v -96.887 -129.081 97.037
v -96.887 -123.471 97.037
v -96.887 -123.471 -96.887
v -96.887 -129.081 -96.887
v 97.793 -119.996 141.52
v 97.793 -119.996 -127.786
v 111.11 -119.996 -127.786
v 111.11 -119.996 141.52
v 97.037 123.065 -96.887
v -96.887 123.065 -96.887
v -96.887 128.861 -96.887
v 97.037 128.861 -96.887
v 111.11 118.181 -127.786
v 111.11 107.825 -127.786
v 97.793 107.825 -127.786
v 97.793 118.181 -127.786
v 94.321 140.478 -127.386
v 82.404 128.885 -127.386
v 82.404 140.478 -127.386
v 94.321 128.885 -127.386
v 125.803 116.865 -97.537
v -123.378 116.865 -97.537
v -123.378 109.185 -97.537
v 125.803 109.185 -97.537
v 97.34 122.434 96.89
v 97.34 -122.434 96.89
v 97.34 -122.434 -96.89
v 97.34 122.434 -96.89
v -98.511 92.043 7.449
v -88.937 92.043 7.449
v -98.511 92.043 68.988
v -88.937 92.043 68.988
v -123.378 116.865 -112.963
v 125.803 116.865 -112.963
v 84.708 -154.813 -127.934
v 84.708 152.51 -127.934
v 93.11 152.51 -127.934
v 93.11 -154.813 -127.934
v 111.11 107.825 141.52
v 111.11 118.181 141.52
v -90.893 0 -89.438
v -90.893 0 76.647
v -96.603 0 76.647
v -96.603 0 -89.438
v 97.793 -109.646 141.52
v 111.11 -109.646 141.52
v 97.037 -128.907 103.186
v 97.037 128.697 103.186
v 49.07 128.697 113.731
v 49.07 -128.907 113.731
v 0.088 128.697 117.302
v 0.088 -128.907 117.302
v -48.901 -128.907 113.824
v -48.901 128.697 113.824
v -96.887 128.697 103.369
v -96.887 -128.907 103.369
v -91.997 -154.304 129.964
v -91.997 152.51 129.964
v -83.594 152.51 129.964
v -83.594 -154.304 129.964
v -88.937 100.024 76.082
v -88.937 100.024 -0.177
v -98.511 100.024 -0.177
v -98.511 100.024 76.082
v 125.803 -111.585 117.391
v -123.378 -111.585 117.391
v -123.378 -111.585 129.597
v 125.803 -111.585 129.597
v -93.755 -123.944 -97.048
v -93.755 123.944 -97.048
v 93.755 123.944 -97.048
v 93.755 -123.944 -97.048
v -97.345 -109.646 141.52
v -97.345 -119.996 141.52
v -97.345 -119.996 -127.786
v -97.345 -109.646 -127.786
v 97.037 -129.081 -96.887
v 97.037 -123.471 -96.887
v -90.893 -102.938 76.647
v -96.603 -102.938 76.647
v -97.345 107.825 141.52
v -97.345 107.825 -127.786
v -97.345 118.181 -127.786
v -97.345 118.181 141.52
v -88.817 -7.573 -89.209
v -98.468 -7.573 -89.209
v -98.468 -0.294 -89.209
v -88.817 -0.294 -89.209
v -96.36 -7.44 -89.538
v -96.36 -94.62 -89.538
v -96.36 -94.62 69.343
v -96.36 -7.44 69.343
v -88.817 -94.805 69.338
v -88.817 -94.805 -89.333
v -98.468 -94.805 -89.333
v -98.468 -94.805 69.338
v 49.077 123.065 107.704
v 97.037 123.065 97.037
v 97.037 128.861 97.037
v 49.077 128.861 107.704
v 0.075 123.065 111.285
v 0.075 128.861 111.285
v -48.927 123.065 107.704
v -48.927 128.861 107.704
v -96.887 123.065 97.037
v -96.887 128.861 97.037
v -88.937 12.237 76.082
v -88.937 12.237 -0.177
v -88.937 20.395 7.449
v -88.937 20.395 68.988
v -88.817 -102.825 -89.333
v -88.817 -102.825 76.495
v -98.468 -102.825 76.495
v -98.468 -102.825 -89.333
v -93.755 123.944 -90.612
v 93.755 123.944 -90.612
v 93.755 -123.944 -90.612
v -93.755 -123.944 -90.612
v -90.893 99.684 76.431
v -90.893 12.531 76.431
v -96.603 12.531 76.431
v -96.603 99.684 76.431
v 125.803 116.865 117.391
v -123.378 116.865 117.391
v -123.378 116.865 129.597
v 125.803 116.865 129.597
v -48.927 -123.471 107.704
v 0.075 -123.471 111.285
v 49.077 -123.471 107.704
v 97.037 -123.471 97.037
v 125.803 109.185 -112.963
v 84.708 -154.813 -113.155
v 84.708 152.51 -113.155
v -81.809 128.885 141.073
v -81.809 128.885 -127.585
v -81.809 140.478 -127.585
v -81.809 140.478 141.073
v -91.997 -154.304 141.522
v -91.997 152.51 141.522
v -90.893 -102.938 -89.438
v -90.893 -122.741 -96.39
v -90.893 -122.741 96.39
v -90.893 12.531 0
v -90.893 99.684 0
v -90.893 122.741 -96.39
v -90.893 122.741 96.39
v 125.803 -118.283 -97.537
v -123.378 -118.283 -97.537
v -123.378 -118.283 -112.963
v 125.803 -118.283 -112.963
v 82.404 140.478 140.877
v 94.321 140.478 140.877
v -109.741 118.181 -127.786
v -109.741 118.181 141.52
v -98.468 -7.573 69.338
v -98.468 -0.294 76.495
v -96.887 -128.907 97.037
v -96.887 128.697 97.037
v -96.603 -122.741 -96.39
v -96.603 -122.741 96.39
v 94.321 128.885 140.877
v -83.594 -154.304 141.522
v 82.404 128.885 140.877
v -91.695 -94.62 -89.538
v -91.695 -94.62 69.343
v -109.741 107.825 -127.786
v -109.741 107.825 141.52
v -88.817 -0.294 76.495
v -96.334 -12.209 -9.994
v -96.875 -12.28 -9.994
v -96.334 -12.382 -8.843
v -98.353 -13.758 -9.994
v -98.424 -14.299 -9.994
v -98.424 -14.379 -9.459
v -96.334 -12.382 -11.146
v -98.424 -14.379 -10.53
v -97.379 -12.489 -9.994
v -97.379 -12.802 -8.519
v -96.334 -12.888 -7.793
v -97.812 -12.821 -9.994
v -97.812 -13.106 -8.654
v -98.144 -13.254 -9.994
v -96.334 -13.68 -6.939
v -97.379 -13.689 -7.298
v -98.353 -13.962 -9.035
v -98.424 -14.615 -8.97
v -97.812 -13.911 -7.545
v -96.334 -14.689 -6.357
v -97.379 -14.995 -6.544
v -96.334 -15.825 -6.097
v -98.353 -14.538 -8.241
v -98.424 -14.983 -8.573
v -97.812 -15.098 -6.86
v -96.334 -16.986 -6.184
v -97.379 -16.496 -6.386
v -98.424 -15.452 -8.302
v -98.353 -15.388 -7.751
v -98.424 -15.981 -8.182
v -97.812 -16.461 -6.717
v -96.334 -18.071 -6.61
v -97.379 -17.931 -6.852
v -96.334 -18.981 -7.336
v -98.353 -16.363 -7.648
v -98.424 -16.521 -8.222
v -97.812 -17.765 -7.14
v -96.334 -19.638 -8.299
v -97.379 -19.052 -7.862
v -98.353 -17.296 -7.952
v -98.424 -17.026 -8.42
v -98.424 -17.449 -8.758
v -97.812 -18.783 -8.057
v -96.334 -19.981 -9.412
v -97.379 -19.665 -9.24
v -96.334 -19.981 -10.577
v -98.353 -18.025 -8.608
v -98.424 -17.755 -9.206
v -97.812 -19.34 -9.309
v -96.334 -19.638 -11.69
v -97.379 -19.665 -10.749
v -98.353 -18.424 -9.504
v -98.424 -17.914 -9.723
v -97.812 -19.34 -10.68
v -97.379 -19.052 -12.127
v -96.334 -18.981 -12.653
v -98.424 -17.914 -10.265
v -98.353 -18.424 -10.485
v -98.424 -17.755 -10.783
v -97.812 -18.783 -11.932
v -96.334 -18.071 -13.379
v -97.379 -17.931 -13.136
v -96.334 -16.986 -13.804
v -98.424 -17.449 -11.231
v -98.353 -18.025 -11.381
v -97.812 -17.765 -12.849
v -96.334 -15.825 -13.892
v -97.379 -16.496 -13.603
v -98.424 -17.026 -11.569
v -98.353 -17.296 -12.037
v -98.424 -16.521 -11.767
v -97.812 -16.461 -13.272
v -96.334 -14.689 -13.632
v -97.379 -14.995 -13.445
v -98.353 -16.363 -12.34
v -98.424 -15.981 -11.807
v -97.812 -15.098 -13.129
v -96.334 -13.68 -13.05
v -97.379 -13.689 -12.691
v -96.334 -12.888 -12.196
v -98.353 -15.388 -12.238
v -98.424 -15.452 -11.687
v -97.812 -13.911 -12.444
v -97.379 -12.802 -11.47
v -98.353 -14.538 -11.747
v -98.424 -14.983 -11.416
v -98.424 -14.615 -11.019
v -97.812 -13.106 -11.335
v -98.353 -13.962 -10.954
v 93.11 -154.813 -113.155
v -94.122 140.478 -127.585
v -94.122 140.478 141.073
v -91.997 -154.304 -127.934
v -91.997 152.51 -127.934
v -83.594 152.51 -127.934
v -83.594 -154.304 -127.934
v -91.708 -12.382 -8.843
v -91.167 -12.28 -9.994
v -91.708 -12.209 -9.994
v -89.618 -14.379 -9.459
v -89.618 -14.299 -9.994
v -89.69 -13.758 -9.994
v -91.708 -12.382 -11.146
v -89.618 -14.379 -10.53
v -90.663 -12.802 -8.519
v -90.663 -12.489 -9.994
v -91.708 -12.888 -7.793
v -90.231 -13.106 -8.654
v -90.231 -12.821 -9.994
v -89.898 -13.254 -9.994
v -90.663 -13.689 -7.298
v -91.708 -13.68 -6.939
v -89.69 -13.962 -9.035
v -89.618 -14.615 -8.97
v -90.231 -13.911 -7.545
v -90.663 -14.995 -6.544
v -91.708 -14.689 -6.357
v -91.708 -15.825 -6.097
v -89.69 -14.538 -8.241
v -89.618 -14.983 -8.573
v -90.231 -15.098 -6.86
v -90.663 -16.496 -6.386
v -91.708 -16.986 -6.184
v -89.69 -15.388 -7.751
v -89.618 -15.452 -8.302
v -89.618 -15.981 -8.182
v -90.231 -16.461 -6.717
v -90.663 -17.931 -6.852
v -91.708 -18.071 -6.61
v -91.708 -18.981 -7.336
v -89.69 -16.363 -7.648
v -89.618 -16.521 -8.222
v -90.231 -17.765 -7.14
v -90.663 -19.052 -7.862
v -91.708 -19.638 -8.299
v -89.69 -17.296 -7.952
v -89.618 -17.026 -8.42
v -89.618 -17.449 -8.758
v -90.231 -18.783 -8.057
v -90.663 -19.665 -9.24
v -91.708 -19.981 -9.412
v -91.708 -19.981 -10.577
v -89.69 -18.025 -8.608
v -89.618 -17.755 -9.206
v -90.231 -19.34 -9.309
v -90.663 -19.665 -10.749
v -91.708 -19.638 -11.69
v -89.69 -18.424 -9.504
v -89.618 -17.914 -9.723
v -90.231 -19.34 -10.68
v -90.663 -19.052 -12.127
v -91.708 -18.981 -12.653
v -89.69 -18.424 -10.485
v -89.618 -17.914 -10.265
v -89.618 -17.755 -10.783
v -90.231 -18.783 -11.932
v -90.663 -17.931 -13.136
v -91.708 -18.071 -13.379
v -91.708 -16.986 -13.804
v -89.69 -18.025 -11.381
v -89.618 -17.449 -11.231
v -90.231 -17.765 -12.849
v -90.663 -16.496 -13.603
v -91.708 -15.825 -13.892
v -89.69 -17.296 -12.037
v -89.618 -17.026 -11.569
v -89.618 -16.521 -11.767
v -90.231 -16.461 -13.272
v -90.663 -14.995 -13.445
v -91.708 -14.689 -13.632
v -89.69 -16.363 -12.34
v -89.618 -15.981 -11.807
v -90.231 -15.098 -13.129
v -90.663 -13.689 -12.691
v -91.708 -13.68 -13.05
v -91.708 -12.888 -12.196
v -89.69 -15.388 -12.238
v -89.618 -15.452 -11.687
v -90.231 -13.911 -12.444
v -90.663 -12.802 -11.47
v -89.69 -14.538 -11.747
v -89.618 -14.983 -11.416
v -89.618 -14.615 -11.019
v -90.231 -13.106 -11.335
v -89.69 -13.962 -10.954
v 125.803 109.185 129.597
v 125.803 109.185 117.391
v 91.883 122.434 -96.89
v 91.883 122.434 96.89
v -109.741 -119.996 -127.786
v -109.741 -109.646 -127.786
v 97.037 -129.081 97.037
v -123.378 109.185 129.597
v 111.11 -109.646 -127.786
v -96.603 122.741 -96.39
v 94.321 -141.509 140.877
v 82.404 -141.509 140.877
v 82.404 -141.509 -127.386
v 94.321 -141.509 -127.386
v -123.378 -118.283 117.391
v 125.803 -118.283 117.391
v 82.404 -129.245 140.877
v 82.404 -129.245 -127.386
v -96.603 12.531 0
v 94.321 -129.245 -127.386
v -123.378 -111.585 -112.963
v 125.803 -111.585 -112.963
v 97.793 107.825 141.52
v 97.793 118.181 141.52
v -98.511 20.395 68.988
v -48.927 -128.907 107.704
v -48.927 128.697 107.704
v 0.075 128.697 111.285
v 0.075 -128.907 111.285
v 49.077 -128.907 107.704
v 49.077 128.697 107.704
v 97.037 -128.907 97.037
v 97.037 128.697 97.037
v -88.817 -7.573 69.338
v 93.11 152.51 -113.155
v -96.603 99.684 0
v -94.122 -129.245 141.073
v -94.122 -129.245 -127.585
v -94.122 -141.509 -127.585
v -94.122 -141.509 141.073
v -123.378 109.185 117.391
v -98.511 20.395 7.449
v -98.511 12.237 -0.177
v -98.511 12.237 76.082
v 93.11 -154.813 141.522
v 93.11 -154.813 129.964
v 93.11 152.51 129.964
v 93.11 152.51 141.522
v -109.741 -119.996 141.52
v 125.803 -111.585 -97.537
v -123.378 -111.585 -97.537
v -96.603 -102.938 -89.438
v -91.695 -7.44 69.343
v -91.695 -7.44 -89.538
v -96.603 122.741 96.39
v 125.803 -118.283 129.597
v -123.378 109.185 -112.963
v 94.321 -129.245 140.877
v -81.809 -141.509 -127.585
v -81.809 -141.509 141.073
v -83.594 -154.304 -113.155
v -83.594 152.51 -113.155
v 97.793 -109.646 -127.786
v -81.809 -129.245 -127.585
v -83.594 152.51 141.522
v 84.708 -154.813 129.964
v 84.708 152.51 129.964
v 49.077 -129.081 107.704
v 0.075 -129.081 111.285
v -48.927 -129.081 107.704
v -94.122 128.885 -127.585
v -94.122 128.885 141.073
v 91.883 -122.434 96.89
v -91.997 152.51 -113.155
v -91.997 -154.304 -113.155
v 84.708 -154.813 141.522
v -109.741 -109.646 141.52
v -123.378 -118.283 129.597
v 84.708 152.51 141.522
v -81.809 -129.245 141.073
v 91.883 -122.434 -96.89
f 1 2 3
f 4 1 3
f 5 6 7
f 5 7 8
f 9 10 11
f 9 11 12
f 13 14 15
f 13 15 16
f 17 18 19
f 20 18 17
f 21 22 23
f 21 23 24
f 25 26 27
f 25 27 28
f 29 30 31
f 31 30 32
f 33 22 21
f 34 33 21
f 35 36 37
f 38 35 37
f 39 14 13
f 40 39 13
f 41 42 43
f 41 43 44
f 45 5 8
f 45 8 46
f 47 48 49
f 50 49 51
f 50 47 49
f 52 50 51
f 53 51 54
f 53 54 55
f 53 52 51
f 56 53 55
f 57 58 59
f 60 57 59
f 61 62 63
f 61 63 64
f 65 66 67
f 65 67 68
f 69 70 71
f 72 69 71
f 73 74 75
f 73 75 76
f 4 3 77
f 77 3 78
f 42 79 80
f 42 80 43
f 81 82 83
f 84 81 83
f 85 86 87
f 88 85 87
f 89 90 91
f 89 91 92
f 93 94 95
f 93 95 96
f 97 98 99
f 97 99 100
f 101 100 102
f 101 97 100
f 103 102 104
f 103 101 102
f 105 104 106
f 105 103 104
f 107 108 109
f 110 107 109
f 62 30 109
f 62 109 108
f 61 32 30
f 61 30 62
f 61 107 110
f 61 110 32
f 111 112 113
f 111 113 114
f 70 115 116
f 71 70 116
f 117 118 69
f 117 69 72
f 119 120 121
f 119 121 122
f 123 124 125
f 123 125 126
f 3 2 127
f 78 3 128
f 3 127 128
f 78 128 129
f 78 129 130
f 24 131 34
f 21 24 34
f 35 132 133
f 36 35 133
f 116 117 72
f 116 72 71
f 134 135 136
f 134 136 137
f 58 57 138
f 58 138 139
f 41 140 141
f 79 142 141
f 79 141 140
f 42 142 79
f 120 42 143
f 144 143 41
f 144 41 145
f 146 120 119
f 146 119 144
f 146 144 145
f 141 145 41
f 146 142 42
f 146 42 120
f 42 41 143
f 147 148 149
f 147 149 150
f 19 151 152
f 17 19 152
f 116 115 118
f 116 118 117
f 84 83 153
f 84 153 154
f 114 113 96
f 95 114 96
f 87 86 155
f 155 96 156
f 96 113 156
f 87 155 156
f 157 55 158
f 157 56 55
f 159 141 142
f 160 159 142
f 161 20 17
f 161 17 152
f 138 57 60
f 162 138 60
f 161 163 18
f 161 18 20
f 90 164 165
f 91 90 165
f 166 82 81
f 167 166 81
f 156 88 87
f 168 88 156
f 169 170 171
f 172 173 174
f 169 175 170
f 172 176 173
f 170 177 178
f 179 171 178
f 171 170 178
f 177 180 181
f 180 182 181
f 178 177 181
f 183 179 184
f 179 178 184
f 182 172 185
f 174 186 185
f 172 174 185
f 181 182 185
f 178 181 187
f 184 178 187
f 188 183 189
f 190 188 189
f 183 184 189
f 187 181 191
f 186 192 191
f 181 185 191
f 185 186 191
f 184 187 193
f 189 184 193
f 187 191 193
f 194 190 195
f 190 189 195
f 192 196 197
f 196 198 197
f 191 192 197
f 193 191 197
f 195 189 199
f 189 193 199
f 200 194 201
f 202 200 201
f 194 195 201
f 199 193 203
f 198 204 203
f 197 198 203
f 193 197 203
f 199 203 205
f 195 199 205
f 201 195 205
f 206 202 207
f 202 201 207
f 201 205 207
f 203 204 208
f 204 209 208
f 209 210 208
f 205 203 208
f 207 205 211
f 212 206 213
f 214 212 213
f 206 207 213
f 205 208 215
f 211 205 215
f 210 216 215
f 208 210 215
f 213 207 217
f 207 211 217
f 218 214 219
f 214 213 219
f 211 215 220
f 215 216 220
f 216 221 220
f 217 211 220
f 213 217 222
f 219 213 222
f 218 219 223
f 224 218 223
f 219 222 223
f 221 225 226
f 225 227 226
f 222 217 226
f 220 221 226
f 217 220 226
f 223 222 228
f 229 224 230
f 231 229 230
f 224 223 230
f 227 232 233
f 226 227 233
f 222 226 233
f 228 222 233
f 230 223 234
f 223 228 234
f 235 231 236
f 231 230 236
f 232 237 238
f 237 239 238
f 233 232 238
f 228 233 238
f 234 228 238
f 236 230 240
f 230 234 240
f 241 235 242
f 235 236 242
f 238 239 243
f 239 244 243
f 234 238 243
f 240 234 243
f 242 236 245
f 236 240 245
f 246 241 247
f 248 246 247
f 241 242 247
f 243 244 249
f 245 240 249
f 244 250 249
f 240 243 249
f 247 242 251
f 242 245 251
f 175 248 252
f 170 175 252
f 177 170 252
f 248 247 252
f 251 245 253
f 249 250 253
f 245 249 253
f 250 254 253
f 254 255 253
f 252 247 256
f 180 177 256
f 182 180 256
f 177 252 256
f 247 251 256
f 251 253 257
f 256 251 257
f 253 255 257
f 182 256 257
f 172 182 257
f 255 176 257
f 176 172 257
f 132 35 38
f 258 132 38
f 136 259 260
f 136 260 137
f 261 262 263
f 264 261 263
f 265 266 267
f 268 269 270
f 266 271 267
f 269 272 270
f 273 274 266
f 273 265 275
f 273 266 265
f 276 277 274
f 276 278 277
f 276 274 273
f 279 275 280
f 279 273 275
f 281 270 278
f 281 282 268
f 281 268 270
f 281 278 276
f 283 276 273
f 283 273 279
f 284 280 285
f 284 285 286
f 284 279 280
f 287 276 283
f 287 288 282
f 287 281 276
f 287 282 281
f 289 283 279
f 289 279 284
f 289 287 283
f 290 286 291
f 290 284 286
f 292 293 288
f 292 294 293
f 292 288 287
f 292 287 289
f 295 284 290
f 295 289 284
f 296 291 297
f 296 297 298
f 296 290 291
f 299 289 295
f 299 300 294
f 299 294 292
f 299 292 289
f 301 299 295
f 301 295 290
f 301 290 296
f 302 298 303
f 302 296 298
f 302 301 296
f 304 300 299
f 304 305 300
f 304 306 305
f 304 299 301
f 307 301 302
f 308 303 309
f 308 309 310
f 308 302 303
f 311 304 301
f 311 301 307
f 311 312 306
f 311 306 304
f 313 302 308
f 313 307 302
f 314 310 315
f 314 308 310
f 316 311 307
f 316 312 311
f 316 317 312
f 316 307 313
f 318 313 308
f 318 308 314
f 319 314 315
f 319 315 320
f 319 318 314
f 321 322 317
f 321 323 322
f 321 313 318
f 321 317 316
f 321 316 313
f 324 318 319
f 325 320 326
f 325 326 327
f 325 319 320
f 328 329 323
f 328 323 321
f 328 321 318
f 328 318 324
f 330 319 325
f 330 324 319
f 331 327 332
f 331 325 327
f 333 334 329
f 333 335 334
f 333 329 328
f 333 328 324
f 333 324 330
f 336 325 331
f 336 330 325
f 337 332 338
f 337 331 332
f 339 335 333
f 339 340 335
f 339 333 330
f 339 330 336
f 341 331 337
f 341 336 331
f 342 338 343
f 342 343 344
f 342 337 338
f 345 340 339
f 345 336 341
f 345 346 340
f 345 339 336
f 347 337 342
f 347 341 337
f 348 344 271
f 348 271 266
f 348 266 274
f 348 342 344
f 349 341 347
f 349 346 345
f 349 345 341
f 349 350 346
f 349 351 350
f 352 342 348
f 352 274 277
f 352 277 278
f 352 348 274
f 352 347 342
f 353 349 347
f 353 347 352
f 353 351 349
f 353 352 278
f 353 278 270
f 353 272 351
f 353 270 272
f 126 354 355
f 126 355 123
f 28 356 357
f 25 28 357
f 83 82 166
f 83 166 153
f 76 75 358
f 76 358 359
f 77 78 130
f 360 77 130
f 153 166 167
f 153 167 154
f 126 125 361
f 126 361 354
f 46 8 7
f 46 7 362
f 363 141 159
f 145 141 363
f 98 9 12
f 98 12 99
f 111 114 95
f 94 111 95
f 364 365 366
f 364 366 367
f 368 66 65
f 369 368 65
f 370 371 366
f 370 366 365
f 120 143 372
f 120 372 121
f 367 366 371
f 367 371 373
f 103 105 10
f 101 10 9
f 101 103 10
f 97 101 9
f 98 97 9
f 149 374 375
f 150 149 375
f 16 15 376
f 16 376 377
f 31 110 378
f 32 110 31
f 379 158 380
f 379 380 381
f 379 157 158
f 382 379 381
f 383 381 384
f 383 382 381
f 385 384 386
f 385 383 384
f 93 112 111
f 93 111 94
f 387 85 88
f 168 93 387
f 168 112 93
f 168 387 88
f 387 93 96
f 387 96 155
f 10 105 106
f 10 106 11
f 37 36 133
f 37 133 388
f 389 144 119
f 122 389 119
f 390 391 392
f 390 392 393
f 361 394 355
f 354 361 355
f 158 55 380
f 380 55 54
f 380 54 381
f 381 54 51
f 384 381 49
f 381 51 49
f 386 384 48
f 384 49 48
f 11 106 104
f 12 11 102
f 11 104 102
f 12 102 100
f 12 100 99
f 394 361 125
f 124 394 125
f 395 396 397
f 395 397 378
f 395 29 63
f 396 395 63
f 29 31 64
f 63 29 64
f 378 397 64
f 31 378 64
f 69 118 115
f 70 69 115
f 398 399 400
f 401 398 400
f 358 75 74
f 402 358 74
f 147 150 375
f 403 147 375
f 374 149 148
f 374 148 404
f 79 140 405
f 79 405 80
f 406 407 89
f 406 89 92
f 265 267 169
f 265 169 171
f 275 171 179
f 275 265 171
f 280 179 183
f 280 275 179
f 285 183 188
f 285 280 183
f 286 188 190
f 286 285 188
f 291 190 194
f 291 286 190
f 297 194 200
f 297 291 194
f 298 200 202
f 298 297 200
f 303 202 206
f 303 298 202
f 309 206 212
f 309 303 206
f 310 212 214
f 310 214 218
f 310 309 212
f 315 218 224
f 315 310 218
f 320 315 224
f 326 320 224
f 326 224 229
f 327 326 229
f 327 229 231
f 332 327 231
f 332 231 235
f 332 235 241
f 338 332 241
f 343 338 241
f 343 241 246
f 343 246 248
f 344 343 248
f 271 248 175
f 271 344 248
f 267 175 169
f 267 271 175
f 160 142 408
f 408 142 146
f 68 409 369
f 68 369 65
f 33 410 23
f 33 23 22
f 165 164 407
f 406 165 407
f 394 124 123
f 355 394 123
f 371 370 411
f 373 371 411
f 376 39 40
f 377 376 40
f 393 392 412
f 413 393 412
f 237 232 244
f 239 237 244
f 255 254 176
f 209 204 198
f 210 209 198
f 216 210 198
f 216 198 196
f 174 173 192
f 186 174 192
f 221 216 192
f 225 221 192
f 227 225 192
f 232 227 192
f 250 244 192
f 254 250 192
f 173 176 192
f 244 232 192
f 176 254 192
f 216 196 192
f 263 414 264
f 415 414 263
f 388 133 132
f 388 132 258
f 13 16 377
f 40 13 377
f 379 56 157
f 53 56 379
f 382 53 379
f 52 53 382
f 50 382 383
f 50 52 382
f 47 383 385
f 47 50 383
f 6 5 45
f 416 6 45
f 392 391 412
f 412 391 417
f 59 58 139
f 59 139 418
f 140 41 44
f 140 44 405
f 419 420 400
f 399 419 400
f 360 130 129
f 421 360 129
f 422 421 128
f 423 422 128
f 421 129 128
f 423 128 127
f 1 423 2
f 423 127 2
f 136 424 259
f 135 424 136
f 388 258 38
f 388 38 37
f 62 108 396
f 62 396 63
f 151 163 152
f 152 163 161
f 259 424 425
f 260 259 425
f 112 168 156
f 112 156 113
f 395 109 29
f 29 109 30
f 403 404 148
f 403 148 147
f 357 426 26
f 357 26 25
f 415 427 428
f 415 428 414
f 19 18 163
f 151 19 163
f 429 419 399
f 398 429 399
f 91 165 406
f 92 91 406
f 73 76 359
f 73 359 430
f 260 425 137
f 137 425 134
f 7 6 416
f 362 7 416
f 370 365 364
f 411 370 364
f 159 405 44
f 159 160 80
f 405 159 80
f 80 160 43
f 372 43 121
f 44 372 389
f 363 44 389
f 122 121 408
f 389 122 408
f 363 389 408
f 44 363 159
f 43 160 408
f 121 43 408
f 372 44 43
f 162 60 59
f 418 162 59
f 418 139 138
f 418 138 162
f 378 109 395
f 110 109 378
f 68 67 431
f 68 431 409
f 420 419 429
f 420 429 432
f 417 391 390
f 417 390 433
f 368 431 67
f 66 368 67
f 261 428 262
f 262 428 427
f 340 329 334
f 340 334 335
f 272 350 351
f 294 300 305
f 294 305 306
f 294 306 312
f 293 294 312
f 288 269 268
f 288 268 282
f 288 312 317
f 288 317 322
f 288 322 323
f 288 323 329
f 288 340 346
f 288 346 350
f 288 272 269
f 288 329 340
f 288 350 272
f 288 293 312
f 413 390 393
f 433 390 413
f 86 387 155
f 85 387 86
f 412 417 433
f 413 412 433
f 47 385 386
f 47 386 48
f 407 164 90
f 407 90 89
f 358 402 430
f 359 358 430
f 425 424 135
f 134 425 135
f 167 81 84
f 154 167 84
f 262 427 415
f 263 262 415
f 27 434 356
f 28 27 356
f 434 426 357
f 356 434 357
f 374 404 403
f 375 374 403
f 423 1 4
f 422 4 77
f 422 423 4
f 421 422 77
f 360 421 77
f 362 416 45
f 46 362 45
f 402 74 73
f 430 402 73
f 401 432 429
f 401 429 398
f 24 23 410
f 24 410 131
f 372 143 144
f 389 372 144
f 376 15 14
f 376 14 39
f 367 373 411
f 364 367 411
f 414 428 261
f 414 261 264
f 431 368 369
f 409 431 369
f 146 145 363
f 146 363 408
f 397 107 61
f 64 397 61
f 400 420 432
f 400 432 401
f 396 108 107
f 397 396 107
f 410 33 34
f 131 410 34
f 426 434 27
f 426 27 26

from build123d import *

# Parameters (mm, degrees)
F3_START      = -123.0650097132
F3_DEPTH      = 5.7963579893
F5_START      = -90.6123444438
F4_W          = 187.5103265047
F4_H          = 247.888892889
F5_DEPTH      = 6.435342133
F6_DEPTH      = 128.9073675871
F6_DEPTH_BACK = 128.6972612143
F7_START      = 123.4710663557
F7_DEPTH      = 5.6094527245
F9_START      = 91.8827354908
F8_W          = 244.867682457
F8_H          = 193.7794089317
F9_DEPTH      = 5.4575353861
F11_START     = -90.8925160766
F10_W         = 245.4828619957
F10_H         = 192.7795410156
F10_W_2       = 87.1525136754
F10_H_2       = 76.4309763908
F11_DEPTH     = 5.7103261352
F10_W_3       = 72.0724808052
F10_H_3       = 61.7944300175
F12_DEPTH     = 25.4
F15_START     = -88.9365822077
F14_W         = 87.7868533134
F14_H         = 76.2592852116
F14_W_2       = 71.6482400894
F14_H_2       = 61.5394636989
F15_DEPTH     = 9.5741301775
F17_START     = -91.6945785284
F16_W         = 87.1799633379
F16_H         = 158.8803604245
F17_DEPTH     = 4.6653226018
F19_START     = -88.8174176216
F19_DEPTH     = 9.6507817507
F21_START     = -89.6183401346
F20_R         = 3.9080389163
F21_DEPTH     = 8.8060647249
F22_R         = 2.0900958716
F24_START     = 97.7928191423
F23_W         = 10.3558301926
F23_H         = 269.3057358265
F24_DEPTH     = 13.3169591427
F23_W_2       = 10.3495940566
F25_START     = -97.3452329636
F25_DEPTH     = 12.3960673809
F27_START     = -128.8853734732
F26_W         = 11.9174420834
F26_H         = 268.2635486126
F27_DEPTH     = 11.5931034088
F26_W_2       = 12.3124718666
F26_H_2       = 268.6581909657
F28_START     = 129.2447000742
F28_DEPTH     = 12.2640728951
F30_START     = 129.9640238285
F29_W         = 8.402377367
F29_H         = 306.8140745163
F30_DEPTH     = 11.5577429533
F29_H_2       = 307.3233067989
F31_START     = -113.1547391415
F31_DEPTH     = 14.7791802883
F33_START     = -97.5365191698
F32_W         = 249.1806745529
F32_H         = 7.6806098223
F33_DEPTH     = 15.4261887074
F32_H_2       = 6.6973119974
F34_START     = 117.3913180828
F34_DEPTH     = 12.2061520815


with BuildPart() as f3:
    # F0 (on Front) → F3 (new body)
    with BuildSketch(Plane.XZ.offset(F3_START)):
        with BuildLine():
            Line((97.0369726419, -96.8869626522), (97.0369726419, 97.0369651914))
            ThreePointArc((97.0369726419, 97.0369651914), (0.0750124454, 111.2850093867), (-96.886947751, 97.0369651914))
            Line((-96.886947751, 97.0369651914), (-96.886947751, -96.8869626522))
            Line((-96.886947751, -96.8869626522), (97.0369726419, -96.8869626522))
        make_face()
    extrude(amount=-F3_DEPTH)


with BuildPart() as f5:
    # F4 (on Top) → F5 (new body)
    with BuildSketch(Plane.XY.offset(F5_START)):
        Rectangle(F4_W, F4_H)
    extrude(amount=-F5_DEPTH)


with BuildPart() as f6:
    # F0 (on Front) → F6 (new body, two sides)
    with BuildSketch(Plane.XZ) as f6_sk:
        with BuildLine():
            ThreePointArc((-96.886947751, 97.0369651914), (0.0750124454, 111.2850093867), (97.0369726419, 97.0369651914))
            Line((97.0369726419, 97.0369651914), (97.0369726419, 103.1856536865))
            ThreePointArc((97.0369726419, 103.1856536865), (0.0882706031, 117.3016902224), (-96.886947751, 103.3689826727))
            Line((-96.886947751, 103.3689826727), (-96.886947751, 97.0369651914))
        make_face()
    extrude(amount=F6_DEPTH)
    extrude(f6_sk.sketch, amount=-F6_DEPTH_BACK)


with BuildPart() as f7:
    # F2 (on face) → F7 (new body)
    with BuildSketch(Plane.XZ.offset(F7_START)):
        with BuildLine():
            Line((-96.886947751, -96.8869626522), (97.0369726419, -96.8869626522))
            Line((97.0369726419, -96.8869626522), (97.0369726419, 97.0369651914))
            ThreePointArc((97.0369726419, 97.0369651914), (0.0750124454, 111.2850093867), (-96.886947751, 97.0369651914))
            Line((-96.886947751, 97.0369651914), (-96.886947751, -96.8869626522))
        make_face()
    extrude(amount=F7_DEPTH)


with BuildPart() as f9:
    # F8 (on Right) → F9 (new body)
    with BuildSketch(Plane.YZ.offset(F9_START)):
        Rectangle(F8_W, F8_H)
    extrude(amount=F9_DEPTH)


with BuildPart() as f11:
    # F10 (on Right) → F11 (new body)
    with BuildSketch(Plane.YZ.offset(F11_START)):
        Rectangle(F10_W, F10_H)
        Polygon((0, 76.6467601061), (0, 0), (0, -89.4377827644), (-102.9384583235, -89.4377827644), (-102.9384583235, 76.6467601061), align=None, mode=Mode.SUBTRACT)
        with Locations((56.1074004509, 38.2154881954)):
            Rectangle(F10_W_2, F10_H_2, mode=Mode.SUBTRACT)
    extrude(amount=-F11_DEPTH)


with BuildPart() as f12:
    # F10 (on Right) → F12 (new body)
    with BuildSketch(Plane.YZ):
        Rectangle(F10_W, F10_H)
        Polygon((0, 76.6467601061), (0, 0), (0, -89.4377827644), (-102.9384583235, -89.4377827644), (-102.9384583235, 76.6467601061), align=None, mode=Mode.SUBTRACT)
        with Locations((56.1074004509, 38.2154881954)):
            Rectangle(F10_W_2, F10_H_2, mode=Mode.SUBTRACT)
        with Locations((56.1074004509, 38.2154881954)):
            Rectangle(F10_W_2, F10_H_2)
        with Locations((56.1074004509, 38.2154881954)):
            Rectangle(F10_W_3, F10_H_3, mode=Mode.SUBTRACT)
    extrude(amount=F12_DEPTH)


with BuildPart() as f15:
    # F14 (on Right) → F15 (new body)
    with BuildSketch(Plane.YZ.offset(F15_START)):
        with Locations((56.1304092407, 37.9523038864)):
            Rectangle(F14_W, F14_H)
        with Locations((56.2190711498, 38.2183305919)):
            Rectangle(F14_W_2, F14_H_2, mode=Mode.SUBTRACT)
    extrude(amount=-F15_DEPTH)


with BuildPart() as f17:
    # F16 (on Right) → F17 (new body)
    with BuildSketch(Plane.YZ.offset(F17_START)):
        with Locations((-51.0302581129, -10.097425431)):
            Rectangle(F16_W, F16_H)
    extrude(amount=-F17_DEPTH)


with BuildPart() as f19:
    # F18 (on Right) → F19 (new body)
    with BuildSketch(Plane.YZ.offset(F19_START)):
        Polygon((-7.5731552206, -89.2094299197), (-0.29357741, -89.2094299197), (-0.29357741, 76.494500041), (-102.8251573443, 76.494500041), (-102.8251573443, -89.3327966332), (-94.805277884, -89.3327966332), (-94.805277884, 69.3382769823), (-7.5731552206, 69.3382769823), align=None)
    extrude(amount=-F19_DEPTH)


with BuildPart() as f21:
    # F20 (on Right) → F21 (new body)
    with BuildSketch(Plane.YZ.offset(F21_START)):
        with Locations((-16.1166191101, -9.9944323301)):
            Circle(F20_R)
    extrude(amount=-F21_DEPTH)

    # F22
    f22_edges = [f21.edges().sort_by_distance(p)[0] for p in [
        (-94.021372, -12.20858, -9.994432),
        (-89.61834, -20.024658, -9.994432),
        (-98.424405, -20.024658, -9.994432),
    ]]
    fillet(f22_edges, radius=F22_R)


with BuildPart() as f24:
    # F23 (on Right) → F24 (new body)
    with BuildSketch(Plane.YZ.offset(F24_START)):
        with Locations((113.0030080676, 6.8670511246)):
            Rectangle(F23_W, F23_H)
    extrude(amount=F24_DEPTH)


with BuildPart() as f24b:
    # F23 (on Right) → F24, piece 2 (new body)
    with BuildSketch(Plane.YZ.offset(F24_START)):
        with Locations((-114.8207075894, 6.8670511246)):
            Rectangle(F23_W_2, F23_H)
    extrude(amount=F24_DEPTH)


with BuildPart() as f25:
    # F23 (on Right) → F25 (new body)
    with BuildSketch(Plane.YZ.offset(F25_START)):
        with Locations((-114.8207075894, 6.8670511246)):
            Rectangle(F23_W_2, F23_H)
    extrude(amount=-F25_DEPTH)


with BuildPart() as f25b:
    # F23 (on Right) → F25, piece 2 (new body)
    with BuildSketch(Plane.YZ.offset(F25_START)):
        with Locations((113.0030080676, 6.8670511246)):
            Rectangle(F23_W, F23_H)
    extrude(amount=-F25_DEPTH)


with BuildPart() as f27:
    # F26 (on Front) → F27 (new body)
    with BuildSketch(Plane.XZ.offset(F27_START)):
        with Locations((88.3624106646, 6.7454725504)):
            Rectangle(F26_W, F26_H)
    extrude(amount=-F27_DEPTH)


with BuildPart() as f27b:
    # F26 (on Front) → F27, piece 2 (new body)
    with BuildSketch(Plane.XZ.offset(F27_START)):
        with Locations((-87.9655778408, 6.743863225)):
            Rectangle(F26_W_2, F26_H_2)
    extrude(amount=-F27_DEPTH)


with BuildPart() as f28:
    # F26 (on Front) → F28 (new body)
    with BuildSketch(Plane.XZ.offset(F28_START)):
        with Locations((-87.9655778408, 6.743863225)):
            Rectangle(F26_W_2, F26_H_2)
    extrude(amount=F28_DEPTH)


with BuildPart() as f28b:
    # F26 (on Front) → F28, piece 2 (new body)
    with BuildSketch(Plane.XZ.offset(F28_START)):
        with Locations((88.3624106646, 6.7454725504)):
            Rectangle(F26_W, F26_H)
    extrude(amount=F28_DEPTH)


with BuildPart() as f30:
    # F29 (on Top) → F30 (new body)
    with BuildSketch(Plane.XY.offset(F30_START)):
        with Locations((-87.7953320742, -0.8970797062)):
            Rectangle(F29_W, F29_H)
    extrude(amount=F30_DEPTH)


with BuildPart() as f30b:
    # F29 (on Top) → F30, piece 2 (new body)
    with BuildSketch(Plane.XY.offset(F30_START)):
        with Locations((88.9091938734, -1.1516958475)):
            Rectangle(F29_W, F29_H_2)
    extrude(amount=F30_DEPTH)


with BuildPart() as f31:
    # F29 (on Top) → F31 (new body)
    with BuildSketch(Plane.XY.offset(F31_START)):
        with Locations((88.9091938734, -1.1516958475)):
            Rectangle(F29_W, F29_H_2)
    extrude(amount=-F31_DEPTH)


with BuildPart() as f31b:
    # F29 (on Top) → F31, piece 2 (new body)
    with BuildSketch(Plane.XY.offset(F31_START)):
        with Locations((-87.7953320742, -0.8970797062)):
            Rectangle(F29_W, F29_H)
    extrude(amount=-F31_DEPTH)


with BuildPart() as f33:
    # F32 (on Top) → F33 (new body)
    with BuildSketch(Plane.XY.offset(F33_START)):
        with Locations((1.2121796608, 113.024957478)):
            Rectangle(F32_W, F32_H)
    extrude(amount=-F33_DEPTH)


with BuildPart() as f33b:
    # F32 (on Top) → F33, piece 2 (new body)
    with BuildSketch(Plane.XY.offset(F33_START)):
        with Locations((1.2121796608, -114.9339750409)):
            Rectangle(F32_W, F32_H_2)
    extrude(amount=-F33_DEPTH)


with BuildPart() as f34:
    # F32 (on Top) → F34 (new body)
    with BuildSketch(Plane.XY.offset(F34_START)):
        with Locations((1.2121796608, 113.024957478)):
            Rectangle(F32_W, F32_H)
    extrude(amount=F34_DEPTH)


with BuildPart() as f34b:
    # F32 (on Top) → F34, piece 2 (new body)
    with BuildSketch(Plane.XY.offset(F34_START)):
        with Locations((1.2121796608, -114.9339750409)):
            Rectangle(F32_W, F32_H_2)
    extrude(amount=F34_DEPTH)


solid = Compound([f3.part, f5.part, f6.part, f7.part, f9.part, f11.part, f15.part, f17.part, f19.part, f21.part, f24.part, f24b.part, f25.part, f25b.part, f27.part, f27b.part, f28.part, f28b.part, f30.part, f30b.part, f31.part, f31b.part, f33.part, f33b.part, f34.part, f34b.part])
